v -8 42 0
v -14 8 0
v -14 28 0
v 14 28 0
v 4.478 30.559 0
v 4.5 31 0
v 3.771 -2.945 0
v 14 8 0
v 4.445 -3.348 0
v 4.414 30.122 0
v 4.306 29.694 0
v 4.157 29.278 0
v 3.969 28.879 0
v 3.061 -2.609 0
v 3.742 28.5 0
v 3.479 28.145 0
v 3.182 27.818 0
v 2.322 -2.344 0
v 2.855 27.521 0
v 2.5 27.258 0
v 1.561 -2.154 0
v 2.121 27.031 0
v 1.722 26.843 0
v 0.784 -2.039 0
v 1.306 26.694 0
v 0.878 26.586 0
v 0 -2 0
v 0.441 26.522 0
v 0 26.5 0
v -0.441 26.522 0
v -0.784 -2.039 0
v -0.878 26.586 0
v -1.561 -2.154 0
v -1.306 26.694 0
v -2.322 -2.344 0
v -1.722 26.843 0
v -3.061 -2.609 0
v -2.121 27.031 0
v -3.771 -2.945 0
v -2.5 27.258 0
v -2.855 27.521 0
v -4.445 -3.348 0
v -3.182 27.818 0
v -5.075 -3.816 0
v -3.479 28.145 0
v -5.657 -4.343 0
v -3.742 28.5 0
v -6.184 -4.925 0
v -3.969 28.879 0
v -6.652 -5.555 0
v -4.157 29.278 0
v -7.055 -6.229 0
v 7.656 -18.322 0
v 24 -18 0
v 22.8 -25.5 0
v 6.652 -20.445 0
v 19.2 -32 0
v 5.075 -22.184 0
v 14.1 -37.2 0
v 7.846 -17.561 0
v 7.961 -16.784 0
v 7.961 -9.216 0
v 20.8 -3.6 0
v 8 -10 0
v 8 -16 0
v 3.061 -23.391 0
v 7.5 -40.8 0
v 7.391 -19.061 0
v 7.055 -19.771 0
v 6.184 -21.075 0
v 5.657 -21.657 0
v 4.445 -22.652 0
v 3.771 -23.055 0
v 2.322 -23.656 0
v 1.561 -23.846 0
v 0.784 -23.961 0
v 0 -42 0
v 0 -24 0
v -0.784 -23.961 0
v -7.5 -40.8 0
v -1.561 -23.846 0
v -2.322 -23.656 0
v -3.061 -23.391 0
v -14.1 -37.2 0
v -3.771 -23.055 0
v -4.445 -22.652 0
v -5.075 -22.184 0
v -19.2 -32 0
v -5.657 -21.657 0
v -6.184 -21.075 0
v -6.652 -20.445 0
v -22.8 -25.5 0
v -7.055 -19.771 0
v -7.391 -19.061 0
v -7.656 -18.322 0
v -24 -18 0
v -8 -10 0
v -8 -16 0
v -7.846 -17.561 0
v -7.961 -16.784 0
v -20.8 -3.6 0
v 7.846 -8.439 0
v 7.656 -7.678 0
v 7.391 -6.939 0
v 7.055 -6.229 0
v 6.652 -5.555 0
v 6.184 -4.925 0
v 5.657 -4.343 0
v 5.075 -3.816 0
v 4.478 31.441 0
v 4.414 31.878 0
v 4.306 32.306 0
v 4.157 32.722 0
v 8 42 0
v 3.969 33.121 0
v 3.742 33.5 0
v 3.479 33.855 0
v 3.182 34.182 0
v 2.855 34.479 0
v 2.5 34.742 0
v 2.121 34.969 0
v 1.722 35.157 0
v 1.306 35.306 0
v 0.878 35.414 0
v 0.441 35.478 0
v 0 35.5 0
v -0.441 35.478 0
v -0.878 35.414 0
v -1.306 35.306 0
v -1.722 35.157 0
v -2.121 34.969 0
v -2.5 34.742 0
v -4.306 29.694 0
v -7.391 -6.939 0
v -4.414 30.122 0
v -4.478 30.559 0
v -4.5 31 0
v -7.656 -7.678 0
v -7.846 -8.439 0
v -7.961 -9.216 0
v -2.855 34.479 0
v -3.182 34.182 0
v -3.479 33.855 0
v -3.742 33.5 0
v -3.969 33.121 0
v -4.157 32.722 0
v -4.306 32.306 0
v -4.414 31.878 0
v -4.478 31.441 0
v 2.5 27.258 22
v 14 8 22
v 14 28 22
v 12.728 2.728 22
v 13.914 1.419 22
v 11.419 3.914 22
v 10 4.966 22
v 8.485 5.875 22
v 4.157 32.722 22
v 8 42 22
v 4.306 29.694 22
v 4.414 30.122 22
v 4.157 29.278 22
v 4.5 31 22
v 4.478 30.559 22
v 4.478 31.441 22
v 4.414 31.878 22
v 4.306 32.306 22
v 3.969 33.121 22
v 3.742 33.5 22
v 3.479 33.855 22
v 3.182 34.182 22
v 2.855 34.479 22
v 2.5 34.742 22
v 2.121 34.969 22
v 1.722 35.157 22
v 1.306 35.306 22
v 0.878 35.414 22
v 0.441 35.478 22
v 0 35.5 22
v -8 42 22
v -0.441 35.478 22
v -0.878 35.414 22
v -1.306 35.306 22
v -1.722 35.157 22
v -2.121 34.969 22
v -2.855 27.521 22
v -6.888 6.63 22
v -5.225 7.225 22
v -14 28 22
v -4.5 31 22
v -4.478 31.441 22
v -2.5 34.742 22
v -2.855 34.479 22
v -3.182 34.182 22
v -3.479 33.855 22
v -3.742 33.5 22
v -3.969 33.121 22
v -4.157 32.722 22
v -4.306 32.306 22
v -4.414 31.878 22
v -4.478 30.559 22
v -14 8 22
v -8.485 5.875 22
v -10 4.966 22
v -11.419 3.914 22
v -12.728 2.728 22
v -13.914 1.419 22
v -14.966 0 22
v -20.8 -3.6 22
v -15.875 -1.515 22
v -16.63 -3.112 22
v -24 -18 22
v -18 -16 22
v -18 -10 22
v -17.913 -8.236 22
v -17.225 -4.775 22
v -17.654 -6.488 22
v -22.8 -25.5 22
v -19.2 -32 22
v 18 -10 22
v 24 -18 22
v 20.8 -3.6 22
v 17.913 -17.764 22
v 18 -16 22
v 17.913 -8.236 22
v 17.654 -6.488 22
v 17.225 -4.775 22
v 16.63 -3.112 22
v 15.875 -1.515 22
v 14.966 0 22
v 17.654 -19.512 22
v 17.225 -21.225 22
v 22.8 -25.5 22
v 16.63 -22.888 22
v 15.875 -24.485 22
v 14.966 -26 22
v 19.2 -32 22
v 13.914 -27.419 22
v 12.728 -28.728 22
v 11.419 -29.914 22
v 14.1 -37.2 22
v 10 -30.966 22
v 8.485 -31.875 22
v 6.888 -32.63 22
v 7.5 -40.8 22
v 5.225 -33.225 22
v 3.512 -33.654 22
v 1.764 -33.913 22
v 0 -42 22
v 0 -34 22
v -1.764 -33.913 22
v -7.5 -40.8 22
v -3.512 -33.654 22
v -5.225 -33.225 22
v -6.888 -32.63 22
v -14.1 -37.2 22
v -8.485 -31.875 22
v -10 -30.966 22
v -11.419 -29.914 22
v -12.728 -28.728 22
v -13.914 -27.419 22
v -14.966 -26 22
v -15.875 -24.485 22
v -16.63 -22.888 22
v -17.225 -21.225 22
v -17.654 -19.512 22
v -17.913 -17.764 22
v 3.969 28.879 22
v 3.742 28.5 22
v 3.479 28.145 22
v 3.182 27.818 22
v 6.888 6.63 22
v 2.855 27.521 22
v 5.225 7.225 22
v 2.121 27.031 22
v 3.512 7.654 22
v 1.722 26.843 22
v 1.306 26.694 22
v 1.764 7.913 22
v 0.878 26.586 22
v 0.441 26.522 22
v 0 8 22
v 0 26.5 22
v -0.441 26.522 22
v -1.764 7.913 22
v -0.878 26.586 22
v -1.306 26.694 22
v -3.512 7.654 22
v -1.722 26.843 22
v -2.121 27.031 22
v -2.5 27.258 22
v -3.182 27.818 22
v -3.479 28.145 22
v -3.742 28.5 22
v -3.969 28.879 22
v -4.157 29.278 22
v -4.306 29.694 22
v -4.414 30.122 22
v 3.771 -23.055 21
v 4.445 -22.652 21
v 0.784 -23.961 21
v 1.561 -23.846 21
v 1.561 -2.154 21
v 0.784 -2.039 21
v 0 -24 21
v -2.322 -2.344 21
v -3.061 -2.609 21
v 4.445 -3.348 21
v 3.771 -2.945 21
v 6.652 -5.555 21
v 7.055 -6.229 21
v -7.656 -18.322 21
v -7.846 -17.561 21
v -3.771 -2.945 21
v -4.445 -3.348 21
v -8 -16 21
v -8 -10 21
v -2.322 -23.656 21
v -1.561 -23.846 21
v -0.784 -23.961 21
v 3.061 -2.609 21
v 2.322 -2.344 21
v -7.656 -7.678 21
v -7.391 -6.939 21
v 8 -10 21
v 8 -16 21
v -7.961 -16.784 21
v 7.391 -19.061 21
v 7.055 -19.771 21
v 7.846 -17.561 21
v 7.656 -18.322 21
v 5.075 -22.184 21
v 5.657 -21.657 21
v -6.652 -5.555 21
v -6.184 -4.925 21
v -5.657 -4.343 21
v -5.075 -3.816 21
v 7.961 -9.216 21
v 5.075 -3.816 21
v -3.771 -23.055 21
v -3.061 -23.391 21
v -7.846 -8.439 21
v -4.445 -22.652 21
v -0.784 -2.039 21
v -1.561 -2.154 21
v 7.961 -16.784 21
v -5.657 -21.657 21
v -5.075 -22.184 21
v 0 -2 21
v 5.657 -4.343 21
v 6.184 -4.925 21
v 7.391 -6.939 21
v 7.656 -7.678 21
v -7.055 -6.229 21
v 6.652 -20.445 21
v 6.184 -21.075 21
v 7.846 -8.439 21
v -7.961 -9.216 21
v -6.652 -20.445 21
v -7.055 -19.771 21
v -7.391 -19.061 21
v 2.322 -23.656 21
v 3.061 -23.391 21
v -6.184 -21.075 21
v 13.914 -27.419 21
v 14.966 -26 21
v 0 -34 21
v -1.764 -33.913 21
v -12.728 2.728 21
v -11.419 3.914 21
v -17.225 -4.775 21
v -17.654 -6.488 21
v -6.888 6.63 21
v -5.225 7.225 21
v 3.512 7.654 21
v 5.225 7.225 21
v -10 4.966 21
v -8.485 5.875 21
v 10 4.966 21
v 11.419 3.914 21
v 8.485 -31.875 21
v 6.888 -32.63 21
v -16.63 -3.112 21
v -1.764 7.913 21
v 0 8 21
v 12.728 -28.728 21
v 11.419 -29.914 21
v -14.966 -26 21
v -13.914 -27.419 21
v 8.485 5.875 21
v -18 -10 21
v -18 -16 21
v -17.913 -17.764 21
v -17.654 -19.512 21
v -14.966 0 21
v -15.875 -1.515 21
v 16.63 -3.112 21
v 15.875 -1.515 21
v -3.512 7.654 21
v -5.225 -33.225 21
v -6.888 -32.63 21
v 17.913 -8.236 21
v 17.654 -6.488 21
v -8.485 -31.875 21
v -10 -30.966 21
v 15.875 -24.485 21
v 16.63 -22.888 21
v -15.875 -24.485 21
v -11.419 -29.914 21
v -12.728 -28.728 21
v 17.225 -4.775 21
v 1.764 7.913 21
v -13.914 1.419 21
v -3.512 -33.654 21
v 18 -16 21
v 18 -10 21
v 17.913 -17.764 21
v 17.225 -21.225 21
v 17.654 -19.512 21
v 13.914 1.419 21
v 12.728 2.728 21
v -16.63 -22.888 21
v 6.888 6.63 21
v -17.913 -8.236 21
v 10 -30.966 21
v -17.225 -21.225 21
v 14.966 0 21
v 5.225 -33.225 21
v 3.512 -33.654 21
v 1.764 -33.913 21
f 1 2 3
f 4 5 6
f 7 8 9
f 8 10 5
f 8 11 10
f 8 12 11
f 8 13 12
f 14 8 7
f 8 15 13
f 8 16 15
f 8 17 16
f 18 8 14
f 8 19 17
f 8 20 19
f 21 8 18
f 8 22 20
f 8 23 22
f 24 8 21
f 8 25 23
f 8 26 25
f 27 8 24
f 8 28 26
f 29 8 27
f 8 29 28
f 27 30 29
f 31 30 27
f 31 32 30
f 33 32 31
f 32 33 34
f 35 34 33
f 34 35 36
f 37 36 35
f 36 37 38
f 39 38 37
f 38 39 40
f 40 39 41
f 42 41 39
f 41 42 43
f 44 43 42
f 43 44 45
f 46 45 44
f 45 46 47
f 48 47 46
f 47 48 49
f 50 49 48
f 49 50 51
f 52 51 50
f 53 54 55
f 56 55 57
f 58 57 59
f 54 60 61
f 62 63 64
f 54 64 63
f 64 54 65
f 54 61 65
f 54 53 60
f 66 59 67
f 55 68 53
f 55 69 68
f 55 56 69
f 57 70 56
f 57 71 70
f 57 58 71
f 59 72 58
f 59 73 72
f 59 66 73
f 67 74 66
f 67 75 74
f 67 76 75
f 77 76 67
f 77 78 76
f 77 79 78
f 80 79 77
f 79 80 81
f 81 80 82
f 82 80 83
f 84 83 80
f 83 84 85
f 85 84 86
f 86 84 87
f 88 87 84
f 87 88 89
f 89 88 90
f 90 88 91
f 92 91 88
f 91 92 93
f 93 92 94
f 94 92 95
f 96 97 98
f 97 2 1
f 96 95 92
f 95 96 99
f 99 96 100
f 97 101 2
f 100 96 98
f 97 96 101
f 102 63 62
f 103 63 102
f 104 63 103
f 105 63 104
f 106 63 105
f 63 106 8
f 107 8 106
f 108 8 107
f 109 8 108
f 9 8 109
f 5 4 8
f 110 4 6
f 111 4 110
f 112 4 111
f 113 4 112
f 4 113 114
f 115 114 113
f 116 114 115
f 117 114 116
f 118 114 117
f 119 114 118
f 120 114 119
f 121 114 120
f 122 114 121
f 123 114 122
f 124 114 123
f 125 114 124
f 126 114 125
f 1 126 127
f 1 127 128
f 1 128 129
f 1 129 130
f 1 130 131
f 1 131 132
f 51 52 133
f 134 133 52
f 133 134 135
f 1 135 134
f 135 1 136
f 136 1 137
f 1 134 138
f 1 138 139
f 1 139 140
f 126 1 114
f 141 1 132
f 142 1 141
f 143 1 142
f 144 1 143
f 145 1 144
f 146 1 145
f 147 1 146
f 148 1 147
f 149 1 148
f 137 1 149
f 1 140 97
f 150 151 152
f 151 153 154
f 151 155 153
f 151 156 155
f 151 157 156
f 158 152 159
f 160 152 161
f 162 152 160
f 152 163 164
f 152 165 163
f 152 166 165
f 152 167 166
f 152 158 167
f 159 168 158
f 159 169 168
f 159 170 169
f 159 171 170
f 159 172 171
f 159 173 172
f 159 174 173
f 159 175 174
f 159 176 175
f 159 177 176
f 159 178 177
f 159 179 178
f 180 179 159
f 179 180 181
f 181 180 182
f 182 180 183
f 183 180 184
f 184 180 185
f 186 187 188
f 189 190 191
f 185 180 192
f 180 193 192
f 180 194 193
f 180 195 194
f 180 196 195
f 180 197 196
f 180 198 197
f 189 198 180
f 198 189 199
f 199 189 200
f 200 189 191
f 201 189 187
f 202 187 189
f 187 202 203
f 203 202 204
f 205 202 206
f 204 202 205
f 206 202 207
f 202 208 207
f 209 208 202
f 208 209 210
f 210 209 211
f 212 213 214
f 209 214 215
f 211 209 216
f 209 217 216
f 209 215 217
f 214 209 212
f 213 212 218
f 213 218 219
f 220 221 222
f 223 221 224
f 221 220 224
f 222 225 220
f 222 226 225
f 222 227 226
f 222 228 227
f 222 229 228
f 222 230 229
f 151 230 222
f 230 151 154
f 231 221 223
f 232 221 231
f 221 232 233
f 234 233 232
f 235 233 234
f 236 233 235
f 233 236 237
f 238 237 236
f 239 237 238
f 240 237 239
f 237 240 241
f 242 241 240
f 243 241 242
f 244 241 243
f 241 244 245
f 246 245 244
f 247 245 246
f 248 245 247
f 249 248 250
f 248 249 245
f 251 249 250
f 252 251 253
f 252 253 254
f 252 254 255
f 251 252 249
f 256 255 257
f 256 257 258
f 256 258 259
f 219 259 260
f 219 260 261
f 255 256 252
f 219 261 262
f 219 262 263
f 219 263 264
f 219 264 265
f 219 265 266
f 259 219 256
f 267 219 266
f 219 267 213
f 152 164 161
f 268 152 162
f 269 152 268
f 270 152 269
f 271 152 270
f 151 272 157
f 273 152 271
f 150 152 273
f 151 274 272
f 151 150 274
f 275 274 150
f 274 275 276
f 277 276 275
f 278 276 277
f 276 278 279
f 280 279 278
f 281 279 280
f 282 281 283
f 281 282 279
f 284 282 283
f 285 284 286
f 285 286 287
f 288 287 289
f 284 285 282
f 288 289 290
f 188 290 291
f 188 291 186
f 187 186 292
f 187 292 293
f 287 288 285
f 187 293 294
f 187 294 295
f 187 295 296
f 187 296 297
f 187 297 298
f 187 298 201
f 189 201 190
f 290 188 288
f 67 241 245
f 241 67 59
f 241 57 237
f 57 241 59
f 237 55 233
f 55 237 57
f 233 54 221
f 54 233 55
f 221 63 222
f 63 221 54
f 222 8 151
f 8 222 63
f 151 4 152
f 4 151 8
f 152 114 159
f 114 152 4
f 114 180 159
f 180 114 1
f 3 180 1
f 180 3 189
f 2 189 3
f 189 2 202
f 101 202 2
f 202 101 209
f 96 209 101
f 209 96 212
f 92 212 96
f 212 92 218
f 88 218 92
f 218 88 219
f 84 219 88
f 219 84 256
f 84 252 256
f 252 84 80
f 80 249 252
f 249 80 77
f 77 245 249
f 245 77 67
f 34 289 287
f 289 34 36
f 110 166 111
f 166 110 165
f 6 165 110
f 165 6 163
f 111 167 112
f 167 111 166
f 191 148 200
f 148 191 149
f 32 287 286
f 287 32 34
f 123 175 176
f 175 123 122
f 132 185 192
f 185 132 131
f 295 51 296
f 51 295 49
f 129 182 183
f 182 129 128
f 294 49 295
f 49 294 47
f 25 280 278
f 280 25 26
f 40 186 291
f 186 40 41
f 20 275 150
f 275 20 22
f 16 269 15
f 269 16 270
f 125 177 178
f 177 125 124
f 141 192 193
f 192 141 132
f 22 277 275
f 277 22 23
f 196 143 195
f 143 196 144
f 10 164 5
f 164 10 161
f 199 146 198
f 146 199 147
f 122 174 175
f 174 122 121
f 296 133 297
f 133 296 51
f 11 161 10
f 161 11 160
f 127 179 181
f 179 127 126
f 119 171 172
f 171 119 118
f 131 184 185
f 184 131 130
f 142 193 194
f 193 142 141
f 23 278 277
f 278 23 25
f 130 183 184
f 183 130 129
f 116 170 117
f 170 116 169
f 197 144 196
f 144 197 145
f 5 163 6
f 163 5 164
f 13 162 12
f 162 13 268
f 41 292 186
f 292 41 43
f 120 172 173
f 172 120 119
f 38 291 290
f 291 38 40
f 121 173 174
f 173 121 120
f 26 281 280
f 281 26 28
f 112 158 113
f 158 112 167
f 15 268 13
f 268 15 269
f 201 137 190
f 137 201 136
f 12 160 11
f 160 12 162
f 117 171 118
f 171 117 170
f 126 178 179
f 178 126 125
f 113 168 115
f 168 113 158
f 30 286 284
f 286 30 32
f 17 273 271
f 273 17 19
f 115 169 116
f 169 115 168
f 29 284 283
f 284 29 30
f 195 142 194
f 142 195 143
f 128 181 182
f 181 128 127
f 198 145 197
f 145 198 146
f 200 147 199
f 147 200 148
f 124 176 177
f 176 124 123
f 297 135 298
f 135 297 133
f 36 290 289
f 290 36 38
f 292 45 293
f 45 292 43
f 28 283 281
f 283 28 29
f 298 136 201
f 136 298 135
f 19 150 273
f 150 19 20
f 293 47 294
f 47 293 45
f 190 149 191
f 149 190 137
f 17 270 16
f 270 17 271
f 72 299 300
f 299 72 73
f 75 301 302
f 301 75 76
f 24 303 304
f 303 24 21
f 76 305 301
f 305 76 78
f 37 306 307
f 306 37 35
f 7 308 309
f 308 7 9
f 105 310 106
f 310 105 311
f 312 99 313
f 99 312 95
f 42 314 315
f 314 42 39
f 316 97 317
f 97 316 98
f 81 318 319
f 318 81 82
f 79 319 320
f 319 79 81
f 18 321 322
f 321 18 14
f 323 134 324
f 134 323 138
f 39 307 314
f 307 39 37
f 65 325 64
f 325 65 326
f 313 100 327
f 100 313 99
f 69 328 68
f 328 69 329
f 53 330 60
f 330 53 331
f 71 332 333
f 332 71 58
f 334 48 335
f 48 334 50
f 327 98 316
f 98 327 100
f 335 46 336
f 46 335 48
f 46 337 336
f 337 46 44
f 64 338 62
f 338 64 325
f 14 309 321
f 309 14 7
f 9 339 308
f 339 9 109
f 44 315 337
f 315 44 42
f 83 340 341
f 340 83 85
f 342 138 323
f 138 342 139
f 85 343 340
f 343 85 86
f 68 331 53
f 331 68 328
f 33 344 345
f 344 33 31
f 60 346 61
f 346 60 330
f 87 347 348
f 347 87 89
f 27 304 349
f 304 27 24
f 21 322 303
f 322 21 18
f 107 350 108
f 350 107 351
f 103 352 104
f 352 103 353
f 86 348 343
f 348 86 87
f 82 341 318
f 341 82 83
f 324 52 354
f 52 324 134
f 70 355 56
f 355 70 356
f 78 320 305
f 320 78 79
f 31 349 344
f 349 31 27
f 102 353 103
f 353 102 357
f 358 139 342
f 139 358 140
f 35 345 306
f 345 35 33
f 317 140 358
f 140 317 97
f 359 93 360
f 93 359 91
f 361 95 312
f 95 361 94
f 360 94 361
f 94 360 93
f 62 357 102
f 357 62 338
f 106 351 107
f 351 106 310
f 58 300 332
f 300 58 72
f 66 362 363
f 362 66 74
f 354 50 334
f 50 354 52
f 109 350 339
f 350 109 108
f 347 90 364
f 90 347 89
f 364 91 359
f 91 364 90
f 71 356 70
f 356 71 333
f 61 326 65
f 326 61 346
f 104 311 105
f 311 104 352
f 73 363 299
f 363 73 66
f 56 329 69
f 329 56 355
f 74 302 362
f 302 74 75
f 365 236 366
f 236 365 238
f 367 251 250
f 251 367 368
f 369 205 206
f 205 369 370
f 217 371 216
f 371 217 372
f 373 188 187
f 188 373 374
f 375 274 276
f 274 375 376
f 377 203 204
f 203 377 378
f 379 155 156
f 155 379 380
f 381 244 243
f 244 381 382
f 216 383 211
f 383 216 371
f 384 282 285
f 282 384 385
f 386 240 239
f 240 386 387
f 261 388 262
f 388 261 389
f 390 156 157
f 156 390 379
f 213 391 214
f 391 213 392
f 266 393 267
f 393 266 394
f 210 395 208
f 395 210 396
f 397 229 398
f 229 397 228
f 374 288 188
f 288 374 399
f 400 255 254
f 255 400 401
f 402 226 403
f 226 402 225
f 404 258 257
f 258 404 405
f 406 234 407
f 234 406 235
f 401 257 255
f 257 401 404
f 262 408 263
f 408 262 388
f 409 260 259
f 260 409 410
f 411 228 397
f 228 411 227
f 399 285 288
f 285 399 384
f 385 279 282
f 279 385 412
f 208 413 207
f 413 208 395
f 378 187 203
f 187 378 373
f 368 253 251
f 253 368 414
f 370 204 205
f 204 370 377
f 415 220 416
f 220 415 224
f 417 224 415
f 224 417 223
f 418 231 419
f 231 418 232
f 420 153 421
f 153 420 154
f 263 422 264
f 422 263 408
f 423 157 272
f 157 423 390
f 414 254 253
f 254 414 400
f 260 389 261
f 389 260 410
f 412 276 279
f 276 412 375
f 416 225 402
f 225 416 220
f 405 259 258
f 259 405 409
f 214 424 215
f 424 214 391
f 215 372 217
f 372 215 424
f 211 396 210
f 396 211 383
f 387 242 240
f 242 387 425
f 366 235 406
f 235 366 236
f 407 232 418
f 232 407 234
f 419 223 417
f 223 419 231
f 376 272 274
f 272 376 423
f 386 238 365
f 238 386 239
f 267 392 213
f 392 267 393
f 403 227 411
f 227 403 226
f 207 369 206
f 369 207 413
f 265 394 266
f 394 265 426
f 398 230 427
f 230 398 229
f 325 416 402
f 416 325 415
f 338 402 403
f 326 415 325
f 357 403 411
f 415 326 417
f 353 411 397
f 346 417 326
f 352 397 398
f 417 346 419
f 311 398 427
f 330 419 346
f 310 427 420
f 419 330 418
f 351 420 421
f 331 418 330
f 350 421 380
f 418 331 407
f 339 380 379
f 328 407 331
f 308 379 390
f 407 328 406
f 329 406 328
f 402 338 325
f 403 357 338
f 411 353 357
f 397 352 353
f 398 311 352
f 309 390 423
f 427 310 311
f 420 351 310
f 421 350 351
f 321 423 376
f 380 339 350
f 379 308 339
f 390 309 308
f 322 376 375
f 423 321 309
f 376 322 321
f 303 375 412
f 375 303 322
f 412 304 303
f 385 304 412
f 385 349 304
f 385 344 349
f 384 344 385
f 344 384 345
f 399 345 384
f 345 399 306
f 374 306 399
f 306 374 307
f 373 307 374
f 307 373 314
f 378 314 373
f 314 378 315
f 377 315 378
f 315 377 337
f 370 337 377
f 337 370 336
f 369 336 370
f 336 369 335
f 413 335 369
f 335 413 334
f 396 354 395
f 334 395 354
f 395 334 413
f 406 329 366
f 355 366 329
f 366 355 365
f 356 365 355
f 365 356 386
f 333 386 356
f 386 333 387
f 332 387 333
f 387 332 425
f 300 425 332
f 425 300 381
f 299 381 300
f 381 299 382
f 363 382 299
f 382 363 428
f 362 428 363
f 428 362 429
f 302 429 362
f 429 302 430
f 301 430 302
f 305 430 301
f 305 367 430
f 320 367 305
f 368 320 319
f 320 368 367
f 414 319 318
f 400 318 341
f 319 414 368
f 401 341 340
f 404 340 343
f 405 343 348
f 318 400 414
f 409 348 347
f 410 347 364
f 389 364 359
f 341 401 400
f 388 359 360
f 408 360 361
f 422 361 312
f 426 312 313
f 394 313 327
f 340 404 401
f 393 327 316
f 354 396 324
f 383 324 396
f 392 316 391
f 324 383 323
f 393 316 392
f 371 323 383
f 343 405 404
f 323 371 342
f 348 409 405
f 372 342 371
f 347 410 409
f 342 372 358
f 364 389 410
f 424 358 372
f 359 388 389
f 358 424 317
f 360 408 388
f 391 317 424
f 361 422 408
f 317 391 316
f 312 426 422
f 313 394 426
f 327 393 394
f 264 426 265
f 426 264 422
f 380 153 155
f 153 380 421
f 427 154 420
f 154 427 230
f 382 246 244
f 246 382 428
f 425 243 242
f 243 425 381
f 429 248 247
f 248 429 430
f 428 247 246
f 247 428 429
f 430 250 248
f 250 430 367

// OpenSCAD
// EXH-HGR-90917 teardrop exhaust cushion
// J40 rubber recreation 3D model, units: millimetres.
// Generated by tools/generate_rubber_recreation_3d_models.py.
// OpenSCAD is the source model; export STL only after release parameters are set.

$fn = 64;

module rounded_rect_2d(size, r) {
  hull() {
    translate([-(size[0] / 2 - r), -(size[1] / 2 - r)]) circle(r = r);
    translate([ (size[0] / 2 - r), -(size[1] / 2 - r)]) circle(r = r);
    translate([ (size[0] / 2 - r),  (size[1] / 2 - r)]) circle(r = r);
    translate([-(size[0] / 2 - r),  (size[1] / 2 - r)]) circle(r = r);
  }
}

module capsule_2d(length, width) {
  hull() {
    translate([-(length - width) / 2, 0]) circle(d = width);
    translate([ (length - width) / 2, 0]) circle(d = width);
  }
}

// Hold-only model:
// - Toyota 90917-08004 is a part-family lead, not final geometry release.
// - Use this only as a conversation model until an intact sample or installed
//   support-point measurements release side profile and reinforcement detail.

module teardrop_outer_2d() {
  translate([-24, -42])
    polygon(points = [
    [24, 0],
    [31.5, 1.2],
    [38.1, 4.8],
    [43.2, 10],
    [46.8, 16.5],
    [48, 24],
    [44.8, 38.4],
    [38, 50],
    [38, 70],
    [32, 84],
    [16, 84],
    [10, 70],
    [10, 50],
    [3.2, 38.4],
    [0, 24],
    [1.2, 16.5],
    [4.8, 10],
    [9.9, 4.8],
    [16.5, 1.2]
    ]);
}

module exh_hgr_90917_teardrop_cushion(
  thickness = 22,
  top_hole_d = 9,
  lower_slot = [16, 22],
  boss_size = [36, 42],
  boss_depth = 1.0
) {
  difference() {
    linear_extrude(height = thickness, center = false)
      teardrop_outer_2d();

    translate([0, 31, -1])
      cylinder(h = thickness + 2, d = top_hole_d);

    translate([0, -13, -1])
      rotate([0, 0, 90])
        linear_extrude(height = thickness + 2, center = false)
          capsule_2d(lower_slot[1], lower_slot[0]);

    if (boss_depth > 0)
      translate([0, -13, thickness - boss_depth])
        rotate([0, 0, 90])
          linear_extrude(height = boss_depth + 0.2, center = false)
            capsule_2d(boss_size[1], boss_size[0]);
  }
}

exh_hgr_90917_teardrop_cushion();
